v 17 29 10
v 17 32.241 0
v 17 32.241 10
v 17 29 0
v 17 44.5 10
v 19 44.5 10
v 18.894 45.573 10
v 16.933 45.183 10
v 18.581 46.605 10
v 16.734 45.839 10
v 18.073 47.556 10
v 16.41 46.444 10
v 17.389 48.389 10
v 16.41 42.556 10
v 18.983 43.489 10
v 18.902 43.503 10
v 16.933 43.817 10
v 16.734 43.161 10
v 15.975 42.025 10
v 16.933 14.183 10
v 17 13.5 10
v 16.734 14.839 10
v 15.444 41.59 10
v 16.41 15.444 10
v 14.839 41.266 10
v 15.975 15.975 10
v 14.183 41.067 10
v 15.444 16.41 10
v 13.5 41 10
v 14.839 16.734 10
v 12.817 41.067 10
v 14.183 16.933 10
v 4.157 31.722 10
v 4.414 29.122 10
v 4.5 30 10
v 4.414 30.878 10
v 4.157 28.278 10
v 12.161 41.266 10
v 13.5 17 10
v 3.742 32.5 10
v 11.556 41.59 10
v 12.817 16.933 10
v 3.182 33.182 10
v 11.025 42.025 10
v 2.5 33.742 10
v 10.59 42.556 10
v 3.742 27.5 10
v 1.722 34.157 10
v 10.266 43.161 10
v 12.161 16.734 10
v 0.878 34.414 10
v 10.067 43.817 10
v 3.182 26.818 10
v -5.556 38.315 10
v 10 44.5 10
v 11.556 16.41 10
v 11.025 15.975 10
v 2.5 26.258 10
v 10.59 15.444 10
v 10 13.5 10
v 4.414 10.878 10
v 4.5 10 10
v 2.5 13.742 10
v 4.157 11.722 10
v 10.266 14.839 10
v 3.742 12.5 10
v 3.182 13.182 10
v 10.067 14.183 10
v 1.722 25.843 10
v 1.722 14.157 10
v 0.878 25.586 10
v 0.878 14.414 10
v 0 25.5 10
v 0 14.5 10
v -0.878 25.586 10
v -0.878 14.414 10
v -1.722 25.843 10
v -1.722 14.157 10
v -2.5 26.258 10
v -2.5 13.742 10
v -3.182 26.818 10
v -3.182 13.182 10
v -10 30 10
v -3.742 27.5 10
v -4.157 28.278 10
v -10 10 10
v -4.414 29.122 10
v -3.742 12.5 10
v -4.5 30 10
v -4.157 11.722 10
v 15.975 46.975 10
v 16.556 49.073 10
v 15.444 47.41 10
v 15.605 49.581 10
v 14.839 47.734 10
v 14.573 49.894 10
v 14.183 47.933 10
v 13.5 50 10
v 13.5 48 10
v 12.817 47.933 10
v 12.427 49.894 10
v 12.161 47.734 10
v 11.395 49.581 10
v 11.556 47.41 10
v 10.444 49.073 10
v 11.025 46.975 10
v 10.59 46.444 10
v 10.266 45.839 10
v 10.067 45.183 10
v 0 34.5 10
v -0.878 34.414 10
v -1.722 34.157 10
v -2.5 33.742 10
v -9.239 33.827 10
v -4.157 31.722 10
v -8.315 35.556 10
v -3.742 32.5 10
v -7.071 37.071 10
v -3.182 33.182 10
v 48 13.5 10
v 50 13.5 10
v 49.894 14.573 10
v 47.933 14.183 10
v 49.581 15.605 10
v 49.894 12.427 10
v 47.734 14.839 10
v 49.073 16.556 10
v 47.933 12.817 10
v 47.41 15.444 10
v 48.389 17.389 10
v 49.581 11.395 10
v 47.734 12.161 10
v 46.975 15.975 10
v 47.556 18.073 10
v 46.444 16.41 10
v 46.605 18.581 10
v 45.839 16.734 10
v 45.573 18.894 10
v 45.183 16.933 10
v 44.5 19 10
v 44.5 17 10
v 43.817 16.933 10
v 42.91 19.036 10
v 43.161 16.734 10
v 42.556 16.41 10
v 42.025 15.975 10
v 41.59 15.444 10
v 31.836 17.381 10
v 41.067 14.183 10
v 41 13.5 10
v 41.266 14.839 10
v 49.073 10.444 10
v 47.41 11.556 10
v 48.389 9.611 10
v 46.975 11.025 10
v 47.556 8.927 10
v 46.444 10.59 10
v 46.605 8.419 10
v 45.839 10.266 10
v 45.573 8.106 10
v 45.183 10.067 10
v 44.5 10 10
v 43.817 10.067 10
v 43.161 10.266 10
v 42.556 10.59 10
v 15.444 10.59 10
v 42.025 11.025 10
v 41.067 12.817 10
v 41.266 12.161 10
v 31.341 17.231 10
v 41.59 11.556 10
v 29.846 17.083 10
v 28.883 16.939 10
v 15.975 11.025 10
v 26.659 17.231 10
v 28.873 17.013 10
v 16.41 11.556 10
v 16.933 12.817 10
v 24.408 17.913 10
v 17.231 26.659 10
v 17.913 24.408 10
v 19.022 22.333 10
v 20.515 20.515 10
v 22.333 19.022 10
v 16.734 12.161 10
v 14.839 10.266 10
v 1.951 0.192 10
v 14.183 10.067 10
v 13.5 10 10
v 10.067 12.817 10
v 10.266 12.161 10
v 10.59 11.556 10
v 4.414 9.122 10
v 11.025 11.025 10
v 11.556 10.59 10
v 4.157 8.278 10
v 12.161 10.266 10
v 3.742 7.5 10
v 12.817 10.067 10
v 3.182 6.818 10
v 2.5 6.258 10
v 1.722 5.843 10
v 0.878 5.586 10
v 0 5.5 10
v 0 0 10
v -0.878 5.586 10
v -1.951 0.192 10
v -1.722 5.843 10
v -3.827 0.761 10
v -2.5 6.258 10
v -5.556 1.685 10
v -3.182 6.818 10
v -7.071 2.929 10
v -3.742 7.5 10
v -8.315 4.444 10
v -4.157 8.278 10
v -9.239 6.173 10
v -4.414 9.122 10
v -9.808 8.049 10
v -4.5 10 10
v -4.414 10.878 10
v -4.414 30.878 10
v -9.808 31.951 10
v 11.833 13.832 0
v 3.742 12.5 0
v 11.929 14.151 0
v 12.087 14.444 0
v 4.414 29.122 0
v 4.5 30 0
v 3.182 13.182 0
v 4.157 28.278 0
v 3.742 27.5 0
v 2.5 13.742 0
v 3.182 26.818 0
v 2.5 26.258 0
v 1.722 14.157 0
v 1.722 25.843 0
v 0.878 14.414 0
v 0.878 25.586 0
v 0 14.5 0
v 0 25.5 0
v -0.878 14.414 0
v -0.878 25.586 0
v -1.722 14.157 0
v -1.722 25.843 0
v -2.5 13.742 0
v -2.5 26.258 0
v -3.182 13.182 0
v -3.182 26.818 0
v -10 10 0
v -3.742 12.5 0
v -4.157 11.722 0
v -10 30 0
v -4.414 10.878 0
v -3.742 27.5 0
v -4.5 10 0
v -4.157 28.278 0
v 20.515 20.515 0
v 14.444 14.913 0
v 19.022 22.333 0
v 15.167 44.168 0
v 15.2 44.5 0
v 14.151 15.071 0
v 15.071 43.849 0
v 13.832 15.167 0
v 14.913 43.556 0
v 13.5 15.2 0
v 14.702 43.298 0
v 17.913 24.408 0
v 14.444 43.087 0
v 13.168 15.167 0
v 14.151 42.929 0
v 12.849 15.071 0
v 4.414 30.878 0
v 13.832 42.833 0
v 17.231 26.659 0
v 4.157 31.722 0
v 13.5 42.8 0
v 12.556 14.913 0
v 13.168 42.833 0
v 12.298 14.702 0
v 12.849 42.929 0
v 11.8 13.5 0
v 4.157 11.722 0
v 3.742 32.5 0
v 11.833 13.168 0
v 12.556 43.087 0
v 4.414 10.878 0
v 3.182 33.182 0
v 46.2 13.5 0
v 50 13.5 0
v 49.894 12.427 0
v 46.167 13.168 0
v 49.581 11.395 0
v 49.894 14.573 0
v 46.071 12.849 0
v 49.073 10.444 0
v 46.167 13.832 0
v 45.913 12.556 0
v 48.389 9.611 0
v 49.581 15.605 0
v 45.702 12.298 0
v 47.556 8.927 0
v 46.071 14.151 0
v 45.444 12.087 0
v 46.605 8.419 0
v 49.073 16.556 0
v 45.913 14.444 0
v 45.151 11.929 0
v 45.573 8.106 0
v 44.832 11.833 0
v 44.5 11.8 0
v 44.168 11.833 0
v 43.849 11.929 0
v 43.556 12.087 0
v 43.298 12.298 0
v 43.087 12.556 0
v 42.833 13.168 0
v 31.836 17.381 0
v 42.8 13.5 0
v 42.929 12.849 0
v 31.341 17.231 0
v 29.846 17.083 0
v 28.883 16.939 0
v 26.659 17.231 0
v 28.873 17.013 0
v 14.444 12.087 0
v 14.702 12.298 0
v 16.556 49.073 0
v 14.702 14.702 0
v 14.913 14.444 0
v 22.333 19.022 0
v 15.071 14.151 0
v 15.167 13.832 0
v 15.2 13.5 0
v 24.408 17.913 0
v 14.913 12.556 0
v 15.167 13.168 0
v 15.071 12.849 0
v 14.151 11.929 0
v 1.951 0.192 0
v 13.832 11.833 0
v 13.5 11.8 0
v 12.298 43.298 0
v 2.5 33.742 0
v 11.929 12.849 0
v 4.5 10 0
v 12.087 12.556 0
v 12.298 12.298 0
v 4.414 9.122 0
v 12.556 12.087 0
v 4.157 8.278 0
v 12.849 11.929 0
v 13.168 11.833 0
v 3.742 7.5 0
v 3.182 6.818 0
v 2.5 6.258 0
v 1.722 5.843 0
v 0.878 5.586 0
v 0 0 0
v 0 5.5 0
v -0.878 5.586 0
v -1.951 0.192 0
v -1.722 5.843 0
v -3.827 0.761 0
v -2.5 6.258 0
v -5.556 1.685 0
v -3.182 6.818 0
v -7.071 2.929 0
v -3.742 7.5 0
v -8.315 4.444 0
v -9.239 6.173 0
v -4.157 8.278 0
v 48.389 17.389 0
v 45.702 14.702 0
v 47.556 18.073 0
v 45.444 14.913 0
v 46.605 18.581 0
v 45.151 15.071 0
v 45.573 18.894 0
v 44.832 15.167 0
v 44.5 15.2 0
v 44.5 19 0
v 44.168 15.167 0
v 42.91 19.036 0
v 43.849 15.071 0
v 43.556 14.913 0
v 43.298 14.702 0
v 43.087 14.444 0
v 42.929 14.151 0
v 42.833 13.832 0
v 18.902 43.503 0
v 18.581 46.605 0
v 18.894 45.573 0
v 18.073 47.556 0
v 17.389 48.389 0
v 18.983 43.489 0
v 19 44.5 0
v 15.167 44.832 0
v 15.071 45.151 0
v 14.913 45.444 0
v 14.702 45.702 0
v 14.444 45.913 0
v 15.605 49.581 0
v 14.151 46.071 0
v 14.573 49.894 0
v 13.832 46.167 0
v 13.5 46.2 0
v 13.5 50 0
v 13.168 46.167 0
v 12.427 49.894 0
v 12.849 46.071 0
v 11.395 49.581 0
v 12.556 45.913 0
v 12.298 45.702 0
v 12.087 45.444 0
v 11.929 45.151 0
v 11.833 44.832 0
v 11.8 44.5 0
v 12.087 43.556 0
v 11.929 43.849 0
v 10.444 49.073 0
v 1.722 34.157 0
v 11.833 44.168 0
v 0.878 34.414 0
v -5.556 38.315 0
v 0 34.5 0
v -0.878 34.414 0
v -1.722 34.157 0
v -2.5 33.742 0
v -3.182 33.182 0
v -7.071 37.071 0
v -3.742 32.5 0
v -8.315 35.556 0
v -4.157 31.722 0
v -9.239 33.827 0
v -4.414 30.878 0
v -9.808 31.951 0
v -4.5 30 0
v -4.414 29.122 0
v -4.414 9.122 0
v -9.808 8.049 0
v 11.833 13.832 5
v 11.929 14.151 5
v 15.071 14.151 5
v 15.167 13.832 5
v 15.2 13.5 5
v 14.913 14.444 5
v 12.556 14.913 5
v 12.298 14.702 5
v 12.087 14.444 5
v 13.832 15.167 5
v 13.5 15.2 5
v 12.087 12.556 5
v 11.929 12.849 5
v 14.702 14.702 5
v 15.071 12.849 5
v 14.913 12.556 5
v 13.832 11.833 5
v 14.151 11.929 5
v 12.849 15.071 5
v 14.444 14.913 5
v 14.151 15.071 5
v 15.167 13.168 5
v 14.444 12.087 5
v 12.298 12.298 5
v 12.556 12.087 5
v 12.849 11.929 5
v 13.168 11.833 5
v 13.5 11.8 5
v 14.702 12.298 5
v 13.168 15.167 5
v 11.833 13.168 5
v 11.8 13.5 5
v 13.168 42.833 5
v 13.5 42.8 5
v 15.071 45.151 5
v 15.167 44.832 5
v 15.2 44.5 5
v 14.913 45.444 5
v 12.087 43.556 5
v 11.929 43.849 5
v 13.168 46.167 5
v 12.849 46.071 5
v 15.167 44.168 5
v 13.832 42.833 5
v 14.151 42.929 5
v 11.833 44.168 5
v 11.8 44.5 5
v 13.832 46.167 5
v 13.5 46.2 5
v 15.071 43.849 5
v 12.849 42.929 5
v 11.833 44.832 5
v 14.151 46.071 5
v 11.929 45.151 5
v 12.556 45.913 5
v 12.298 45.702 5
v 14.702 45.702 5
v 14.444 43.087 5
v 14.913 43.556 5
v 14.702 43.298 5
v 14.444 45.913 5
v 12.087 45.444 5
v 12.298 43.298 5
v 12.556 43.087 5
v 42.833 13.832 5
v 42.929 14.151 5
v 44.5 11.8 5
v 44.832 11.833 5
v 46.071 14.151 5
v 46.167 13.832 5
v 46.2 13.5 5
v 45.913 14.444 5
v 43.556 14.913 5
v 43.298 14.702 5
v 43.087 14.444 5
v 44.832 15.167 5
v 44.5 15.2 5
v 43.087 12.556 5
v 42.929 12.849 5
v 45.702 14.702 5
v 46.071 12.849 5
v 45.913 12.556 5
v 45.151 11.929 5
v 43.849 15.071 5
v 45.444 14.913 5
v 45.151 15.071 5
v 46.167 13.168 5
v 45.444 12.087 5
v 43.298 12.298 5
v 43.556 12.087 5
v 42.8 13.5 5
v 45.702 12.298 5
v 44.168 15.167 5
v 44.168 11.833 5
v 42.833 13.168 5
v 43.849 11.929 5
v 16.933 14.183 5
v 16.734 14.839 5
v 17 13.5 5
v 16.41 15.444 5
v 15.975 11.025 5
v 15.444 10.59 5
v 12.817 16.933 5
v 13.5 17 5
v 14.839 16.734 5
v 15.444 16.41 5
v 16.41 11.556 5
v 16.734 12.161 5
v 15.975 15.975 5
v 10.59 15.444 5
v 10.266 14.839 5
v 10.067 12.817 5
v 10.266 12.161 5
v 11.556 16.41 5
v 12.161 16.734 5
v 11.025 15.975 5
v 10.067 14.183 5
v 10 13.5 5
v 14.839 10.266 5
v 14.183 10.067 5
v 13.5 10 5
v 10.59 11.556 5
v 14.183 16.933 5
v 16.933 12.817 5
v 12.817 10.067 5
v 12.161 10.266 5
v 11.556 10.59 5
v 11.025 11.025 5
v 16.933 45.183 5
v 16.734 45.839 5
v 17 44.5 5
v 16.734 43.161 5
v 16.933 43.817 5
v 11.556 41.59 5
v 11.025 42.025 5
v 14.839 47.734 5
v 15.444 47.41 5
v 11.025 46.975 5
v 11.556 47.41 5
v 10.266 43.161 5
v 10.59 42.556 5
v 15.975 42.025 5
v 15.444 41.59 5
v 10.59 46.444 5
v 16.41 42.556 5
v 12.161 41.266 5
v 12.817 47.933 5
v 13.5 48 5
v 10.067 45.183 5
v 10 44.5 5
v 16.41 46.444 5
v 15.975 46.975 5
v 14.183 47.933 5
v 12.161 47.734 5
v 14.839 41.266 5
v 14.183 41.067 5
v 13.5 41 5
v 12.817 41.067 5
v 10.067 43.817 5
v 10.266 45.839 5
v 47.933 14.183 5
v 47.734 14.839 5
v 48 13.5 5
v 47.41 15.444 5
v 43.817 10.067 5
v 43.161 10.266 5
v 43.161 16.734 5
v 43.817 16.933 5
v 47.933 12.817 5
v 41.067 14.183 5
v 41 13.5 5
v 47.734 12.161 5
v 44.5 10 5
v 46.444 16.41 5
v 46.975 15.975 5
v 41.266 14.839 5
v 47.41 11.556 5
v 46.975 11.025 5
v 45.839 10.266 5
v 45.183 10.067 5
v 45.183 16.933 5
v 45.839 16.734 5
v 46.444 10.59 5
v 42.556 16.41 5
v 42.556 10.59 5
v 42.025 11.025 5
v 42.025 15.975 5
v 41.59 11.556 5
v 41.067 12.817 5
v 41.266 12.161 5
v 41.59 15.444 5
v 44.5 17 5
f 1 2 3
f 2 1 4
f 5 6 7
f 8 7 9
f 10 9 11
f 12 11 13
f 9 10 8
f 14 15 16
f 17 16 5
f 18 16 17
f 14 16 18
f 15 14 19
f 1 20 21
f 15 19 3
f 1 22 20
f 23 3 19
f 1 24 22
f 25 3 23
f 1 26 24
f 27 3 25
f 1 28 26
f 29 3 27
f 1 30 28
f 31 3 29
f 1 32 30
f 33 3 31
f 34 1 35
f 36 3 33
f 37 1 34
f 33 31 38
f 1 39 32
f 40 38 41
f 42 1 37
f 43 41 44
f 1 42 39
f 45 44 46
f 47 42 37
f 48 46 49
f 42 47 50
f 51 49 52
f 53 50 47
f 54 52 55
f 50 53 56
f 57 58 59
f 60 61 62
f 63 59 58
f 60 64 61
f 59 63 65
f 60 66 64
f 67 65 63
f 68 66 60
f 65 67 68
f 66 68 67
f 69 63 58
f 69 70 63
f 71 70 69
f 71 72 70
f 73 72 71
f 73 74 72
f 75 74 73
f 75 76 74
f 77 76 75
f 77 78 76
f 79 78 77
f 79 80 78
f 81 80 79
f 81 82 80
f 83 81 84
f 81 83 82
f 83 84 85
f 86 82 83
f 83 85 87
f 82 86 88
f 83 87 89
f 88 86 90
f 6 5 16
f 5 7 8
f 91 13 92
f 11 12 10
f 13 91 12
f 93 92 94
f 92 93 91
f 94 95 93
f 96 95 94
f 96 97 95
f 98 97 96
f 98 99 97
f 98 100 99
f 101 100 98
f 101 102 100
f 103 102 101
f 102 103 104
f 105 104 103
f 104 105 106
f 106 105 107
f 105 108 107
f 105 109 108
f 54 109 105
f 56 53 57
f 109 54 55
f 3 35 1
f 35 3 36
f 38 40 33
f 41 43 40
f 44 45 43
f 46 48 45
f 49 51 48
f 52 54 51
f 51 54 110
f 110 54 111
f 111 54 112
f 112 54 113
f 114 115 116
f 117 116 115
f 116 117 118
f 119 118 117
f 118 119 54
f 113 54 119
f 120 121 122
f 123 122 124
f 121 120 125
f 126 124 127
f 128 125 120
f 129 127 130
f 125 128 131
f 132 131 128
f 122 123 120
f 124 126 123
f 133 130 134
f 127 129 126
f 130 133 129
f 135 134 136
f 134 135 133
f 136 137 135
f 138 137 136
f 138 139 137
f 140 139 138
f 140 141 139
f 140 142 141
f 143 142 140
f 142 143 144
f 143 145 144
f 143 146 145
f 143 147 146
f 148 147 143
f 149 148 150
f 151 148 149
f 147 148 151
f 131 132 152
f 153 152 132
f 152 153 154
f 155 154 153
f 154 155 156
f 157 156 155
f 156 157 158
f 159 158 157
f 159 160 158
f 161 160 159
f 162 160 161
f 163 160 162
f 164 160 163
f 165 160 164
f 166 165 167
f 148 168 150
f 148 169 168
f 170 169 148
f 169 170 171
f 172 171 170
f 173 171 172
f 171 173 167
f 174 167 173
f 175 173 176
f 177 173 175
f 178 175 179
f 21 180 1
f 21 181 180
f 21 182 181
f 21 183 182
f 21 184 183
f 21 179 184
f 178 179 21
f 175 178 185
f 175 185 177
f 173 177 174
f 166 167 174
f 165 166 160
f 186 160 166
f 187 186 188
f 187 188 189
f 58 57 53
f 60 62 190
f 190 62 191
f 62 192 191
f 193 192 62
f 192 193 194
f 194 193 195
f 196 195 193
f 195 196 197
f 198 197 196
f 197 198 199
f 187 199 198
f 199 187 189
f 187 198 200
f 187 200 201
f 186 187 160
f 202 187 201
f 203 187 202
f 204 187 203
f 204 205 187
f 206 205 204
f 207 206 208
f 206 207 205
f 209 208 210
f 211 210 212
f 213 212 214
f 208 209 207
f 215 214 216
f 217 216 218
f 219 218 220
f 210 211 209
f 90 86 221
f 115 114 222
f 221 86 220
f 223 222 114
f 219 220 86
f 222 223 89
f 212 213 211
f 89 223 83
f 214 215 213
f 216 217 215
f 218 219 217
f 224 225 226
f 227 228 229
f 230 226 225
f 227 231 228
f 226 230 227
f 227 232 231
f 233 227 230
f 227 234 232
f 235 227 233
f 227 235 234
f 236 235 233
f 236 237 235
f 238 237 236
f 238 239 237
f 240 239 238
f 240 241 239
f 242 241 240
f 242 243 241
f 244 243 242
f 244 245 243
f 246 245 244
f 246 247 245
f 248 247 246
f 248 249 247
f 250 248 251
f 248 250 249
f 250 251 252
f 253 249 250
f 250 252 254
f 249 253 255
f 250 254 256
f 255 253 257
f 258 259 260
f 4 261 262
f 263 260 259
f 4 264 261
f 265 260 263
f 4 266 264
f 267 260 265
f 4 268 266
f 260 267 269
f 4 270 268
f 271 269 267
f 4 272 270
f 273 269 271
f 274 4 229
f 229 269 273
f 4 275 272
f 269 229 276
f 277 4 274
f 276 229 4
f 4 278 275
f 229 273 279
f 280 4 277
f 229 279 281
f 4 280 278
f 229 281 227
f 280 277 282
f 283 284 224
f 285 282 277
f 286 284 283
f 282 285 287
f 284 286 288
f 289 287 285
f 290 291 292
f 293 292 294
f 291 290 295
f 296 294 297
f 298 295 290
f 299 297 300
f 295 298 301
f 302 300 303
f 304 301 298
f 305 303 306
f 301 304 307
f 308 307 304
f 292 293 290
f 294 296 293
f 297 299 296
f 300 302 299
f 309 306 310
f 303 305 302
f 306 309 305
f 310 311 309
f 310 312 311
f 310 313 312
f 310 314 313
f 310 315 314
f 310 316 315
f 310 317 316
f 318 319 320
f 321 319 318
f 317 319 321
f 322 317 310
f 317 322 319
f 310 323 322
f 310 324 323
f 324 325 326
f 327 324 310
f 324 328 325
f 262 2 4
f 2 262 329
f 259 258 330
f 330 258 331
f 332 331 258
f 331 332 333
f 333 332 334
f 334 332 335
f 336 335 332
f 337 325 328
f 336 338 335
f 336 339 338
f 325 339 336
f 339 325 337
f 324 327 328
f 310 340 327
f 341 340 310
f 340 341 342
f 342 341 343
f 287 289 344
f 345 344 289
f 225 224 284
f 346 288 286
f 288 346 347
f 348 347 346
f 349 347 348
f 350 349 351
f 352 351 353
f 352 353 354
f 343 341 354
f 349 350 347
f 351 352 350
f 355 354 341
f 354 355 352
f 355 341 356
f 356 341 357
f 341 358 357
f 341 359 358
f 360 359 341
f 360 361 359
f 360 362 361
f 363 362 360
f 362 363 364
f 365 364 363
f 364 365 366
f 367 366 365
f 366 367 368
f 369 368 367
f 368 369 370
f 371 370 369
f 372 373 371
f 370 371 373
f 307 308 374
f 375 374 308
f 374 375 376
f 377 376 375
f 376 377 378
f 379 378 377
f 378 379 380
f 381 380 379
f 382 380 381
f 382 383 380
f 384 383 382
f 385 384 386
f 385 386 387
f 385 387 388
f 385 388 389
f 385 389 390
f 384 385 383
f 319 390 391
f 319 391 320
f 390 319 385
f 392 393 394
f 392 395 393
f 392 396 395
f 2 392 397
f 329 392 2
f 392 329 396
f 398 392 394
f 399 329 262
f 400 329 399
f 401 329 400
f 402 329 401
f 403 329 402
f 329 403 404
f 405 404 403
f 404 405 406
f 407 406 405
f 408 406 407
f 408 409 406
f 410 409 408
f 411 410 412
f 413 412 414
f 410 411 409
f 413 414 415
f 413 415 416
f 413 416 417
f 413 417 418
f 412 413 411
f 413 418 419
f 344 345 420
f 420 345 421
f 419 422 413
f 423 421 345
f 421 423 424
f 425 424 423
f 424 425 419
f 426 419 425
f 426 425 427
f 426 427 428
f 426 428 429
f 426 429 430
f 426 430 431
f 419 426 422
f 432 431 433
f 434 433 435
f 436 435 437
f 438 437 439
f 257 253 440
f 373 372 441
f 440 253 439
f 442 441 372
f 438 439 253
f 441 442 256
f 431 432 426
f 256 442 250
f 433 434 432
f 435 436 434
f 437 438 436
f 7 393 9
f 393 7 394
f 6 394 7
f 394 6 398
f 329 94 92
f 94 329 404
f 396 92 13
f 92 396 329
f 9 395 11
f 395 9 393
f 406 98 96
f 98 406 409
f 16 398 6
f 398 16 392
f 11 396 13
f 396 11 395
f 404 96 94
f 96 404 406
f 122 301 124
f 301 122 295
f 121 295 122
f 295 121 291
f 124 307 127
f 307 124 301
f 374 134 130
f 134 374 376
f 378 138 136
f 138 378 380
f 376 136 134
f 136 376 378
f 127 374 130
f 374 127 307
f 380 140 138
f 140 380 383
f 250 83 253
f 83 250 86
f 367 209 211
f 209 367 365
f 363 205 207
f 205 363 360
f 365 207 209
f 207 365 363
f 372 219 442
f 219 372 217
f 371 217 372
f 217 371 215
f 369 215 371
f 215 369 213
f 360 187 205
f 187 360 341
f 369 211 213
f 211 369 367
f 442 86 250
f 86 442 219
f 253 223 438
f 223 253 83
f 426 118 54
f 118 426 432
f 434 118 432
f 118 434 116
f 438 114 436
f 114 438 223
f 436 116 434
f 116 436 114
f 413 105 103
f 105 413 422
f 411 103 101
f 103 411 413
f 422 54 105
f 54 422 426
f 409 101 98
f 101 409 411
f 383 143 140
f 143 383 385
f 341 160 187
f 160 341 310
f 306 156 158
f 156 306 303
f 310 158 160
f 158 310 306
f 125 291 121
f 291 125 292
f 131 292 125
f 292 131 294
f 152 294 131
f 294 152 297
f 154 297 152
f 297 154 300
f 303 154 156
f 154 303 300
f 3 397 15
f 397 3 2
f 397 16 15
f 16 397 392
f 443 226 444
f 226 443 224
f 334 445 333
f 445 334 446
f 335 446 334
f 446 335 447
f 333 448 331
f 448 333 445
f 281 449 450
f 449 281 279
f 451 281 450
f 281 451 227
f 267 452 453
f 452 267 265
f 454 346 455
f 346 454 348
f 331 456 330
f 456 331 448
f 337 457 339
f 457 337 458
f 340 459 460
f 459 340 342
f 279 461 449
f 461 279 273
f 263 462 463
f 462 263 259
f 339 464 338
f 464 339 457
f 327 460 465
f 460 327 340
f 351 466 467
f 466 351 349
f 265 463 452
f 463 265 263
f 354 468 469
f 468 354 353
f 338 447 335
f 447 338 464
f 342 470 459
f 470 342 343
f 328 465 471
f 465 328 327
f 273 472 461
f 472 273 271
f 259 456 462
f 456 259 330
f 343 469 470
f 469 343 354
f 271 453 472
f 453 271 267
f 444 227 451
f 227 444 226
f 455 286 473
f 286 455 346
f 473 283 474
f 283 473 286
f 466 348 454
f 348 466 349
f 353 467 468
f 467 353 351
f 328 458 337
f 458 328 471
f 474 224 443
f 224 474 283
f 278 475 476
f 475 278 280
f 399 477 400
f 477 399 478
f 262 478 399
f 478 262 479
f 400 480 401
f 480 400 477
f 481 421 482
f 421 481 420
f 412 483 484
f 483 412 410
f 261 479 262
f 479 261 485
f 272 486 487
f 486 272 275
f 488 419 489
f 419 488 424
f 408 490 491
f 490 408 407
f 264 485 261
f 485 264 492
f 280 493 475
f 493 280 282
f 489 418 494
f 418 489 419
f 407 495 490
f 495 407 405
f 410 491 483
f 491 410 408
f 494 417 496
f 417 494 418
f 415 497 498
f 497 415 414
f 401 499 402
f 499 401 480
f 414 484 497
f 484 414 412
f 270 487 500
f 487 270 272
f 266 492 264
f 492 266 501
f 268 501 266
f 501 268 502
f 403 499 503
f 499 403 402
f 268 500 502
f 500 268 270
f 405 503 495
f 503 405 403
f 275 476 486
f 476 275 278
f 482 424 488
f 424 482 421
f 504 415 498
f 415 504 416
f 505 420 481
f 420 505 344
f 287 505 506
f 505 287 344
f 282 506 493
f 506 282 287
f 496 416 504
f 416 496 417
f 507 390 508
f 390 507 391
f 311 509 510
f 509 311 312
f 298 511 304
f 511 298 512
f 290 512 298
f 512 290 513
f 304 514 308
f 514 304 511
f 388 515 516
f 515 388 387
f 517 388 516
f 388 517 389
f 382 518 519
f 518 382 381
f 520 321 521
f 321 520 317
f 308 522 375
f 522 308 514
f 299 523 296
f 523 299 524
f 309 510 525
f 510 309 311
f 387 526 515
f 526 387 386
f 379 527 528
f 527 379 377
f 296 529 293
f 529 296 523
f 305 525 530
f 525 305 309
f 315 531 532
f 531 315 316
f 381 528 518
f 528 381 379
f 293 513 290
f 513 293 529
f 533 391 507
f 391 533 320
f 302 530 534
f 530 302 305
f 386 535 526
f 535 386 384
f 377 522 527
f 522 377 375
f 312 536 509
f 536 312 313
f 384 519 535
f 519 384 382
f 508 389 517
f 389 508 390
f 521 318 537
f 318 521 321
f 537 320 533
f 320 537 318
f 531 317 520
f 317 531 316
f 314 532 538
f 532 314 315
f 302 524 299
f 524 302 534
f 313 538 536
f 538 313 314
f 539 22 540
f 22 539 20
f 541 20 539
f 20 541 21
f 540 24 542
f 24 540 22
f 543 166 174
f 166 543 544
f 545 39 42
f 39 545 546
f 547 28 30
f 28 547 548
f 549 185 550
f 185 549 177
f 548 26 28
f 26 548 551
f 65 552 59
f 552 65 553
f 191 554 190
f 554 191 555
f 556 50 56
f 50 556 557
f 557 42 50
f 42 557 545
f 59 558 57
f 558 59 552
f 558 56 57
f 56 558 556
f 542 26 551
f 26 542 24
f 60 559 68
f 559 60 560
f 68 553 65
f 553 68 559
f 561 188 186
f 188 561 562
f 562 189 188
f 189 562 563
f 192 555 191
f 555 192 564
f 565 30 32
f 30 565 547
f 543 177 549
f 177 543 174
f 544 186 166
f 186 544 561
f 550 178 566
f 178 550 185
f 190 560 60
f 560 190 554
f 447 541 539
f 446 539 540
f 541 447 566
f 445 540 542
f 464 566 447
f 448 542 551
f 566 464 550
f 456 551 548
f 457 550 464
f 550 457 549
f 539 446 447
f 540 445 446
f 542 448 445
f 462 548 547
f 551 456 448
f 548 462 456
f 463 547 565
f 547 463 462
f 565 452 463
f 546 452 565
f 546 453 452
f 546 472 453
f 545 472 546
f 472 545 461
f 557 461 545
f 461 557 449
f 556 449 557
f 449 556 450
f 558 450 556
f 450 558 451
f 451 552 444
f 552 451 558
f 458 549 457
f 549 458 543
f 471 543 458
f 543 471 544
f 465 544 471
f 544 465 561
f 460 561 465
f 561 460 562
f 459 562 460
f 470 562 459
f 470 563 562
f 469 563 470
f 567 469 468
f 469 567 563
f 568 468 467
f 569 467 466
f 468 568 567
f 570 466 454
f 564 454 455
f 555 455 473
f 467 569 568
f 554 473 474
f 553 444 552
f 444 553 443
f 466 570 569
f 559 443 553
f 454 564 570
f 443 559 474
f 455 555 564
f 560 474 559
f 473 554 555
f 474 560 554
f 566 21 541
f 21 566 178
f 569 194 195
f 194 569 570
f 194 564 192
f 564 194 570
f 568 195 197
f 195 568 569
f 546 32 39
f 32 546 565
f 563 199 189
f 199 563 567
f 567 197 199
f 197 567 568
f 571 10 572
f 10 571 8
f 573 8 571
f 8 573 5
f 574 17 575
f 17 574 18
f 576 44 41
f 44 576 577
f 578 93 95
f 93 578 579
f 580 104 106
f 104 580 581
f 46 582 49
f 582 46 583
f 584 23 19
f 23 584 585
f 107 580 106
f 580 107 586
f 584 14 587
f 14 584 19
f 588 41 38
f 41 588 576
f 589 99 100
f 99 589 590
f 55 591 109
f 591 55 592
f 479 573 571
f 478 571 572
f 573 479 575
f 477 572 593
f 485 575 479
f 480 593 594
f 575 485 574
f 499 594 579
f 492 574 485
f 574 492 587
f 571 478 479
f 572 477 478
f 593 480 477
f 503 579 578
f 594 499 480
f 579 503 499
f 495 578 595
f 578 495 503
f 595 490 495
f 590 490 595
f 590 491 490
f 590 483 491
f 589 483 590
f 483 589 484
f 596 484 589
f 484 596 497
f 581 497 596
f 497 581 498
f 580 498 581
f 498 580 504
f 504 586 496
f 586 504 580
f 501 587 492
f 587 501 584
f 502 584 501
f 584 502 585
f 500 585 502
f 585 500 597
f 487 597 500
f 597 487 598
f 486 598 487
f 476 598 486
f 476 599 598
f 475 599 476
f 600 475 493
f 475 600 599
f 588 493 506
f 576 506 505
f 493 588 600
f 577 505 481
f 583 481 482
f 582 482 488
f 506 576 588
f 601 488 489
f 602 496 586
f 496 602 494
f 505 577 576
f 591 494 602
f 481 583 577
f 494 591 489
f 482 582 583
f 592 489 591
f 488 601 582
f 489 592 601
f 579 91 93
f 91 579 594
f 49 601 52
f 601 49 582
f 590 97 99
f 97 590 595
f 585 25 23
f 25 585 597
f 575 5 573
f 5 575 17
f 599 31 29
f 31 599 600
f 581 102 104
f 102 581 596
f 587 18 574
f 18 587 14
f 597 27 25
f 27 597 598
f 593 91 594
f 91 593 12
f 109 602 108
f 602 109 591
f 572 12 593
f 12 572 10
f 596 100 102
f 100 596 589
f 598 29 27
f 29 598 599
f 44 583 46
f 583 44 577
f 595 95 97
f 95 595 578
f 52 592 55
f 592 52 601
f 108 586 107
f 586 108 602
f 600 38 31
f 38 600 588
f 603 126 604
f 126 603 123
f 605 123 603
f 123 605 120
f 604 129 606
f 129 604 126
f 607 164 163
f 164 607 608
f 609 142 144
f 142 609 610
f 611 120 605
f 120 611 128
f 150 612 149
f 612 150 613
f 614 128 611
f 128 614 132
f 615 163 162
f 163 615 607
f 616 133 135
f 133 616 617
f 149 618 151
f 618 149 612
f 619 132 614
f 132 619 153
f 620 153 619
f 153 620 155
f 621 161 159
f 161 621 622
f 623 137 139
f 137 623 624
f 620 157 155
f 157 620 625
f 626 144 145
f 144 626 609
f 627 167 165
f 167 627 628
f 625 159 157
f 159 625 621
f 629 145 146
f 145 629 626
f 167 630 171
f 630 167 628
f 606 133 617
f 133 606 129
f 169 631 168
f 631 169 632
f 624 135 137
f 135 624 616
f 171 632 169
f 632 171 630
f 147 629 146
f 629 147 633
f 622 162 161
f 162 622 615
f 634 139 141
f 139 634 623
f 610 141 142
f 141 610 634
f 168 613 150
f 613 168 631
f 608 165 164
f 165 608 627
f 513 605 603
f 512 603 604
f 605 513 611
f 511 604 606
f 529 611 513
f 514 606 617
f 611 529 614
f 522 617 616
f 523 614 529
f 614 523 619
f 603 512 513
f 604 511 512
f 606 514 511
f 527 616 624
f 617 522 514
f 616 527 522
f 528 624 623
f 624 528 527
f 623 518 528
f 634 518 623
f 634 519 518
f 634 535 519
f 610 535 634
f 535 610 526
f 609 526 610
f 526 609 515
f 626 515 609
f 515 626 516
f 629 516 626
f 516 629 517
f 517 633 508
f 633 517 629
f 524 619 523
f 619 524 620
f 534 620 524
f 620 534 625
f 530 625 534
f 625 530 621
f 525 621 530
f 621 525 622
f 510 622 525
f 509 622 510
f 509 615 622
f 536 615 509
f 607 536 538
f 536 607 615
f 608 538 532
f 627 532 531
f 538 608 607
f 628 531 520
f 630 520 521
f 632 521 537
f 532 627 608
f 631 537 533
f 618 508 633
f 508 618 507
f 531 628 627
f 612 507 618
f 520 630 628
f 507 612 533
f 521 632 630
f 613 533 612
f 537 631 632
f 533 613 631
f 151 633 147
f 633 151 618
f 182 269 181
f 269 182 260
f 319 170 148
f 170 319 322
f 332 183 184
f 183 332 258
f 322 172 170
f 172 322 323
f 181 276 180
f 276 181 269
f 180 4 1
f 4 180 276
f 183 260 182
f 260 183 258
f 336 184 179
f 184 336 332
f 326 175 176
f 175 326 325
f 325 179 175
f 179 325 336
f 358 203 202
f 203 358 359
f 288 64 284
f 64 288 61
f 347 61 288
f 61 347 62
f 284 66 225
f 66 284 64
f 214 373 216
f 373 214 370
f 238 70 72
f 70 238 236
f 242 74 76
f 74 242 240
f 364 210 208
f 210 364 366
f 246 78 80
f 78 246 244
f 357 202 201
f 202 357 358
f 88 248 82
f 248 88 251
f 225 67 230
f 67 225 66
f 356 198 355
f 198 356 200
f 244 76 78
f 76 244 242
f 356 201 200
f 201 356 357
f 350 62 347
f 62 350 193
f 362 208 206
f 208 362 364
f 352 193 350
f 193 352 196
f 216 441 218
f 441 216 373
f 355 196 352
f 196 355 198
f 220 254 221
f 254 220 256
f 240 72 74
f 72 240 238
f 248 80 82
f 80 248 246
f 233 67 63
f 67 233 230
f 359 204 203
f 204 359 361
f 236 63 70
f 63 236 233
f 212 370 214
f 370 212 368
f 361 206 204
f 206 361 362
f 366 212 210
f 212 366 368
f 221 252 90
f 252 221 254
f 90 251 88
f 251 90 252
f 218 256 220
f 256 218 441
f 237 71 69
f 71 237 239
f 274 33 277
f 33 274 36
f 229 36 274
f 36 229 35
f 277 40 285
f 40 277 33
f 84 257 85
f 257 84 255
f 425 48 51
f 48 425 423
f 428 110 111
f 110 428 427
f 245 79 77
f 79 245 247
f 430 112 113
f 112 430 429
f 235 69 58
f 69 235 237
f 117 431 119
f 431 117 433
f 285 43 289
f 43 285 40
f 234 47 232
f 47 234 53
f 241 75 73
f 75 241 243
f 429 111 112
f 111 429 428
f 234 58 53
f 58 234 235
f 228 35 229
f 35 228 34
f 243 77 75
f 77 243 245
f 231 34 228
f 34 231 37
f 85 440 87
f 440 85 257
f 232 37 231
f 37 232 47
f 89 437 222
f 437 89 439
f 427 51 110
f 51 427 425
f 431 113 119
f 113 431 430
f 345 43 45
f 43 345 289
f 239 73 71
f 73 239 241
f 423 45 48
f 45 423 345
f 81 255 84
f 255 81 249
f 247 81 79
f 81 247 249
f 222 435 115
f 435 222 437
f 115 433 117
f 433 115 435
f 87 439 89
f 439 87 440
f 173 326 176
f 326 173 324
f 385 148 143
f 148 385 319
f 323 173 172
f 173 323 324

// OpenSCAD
// PRUSA iteration3
// Y motor mount
// GNU GPL v3
// Josef Průša <iam@josefprusa.cz> and contributors
// http://www.reprap.org/wiki/Prusa_Mendel
// http://prusamendel.org

//-- mods by Xoan Sampaiño - A Coruña, May 2013
//--	- added 3rd motor mount point.

//-- further mods by AndrewBCN - Barcelona, November 2014
//--	- added a couple of reinforcements, some code cleanup

$fn=32;


//-- Solid part
module y_motor_base() {
  // Motor holding part
  translate([29,-21+50,0]) {
    translate([-21+4.5,0,5]) cube([9,31,10], center=true);
    translate([-21+4.5+31/2+1,0-31/2-1,5]) cube([31,9,10], center=true);
    translate([-15.5,-15.5,0]) cube([15.5,15.5,10], center=false);
    translate([-15.5,+15.5,0]) cylinder(h = 10, r=5.5);
    translate([+15.5,-15.5,0]) cylinder(h = 10, r=5.5);
    // Joins motor holder and rod plate
    translate([-29,-21,0]) cube(size = [14,30,10]);
  }
  // Front holding part
  translate([-2,20,5]) cube([16,20,10], center=true);	
  translate([0,10,0]) cylinder(h = 10, r=10);
  translate([0,30,0]) cylinder(h = 10, r=10);
  // Reinforcements and smoothing out
  hull() {
    translate([0,30,0]) cylinder(h = 10, r=10);
    translate([29,-21+50,0]) translate([-15.5,+15.5,0]) cylinder(h = 10, r=5.5);
  }
  hull() {
    translate([0,10,0]) cylinder(h = 10, r=10);
    translate([29,-21+50,0]) translate([15.5,-15.5,0]) cylinder(h = 10, r=5.5);
  }
  translate([17,38,5]) rotate([0,0,-10]) cube([2,11.5,10], center=true);
}

//-- Holes
module y_motor_holes() {
  translate([29,-21+50,0]){
    // Screw head holes
    translate([-15.5,-15.5,-1]) cylinder(h = 10, r=1.7);
    translate([-15.5,+15.5,-1]) cylinder(h = 10, r=1.7);
    translate([+15.5,-15.5,-1]) cylinder(h = 10, r=1.7);
    // Screw holes
    translate([-15.5,-15.5,5]) cylinder(h = 7, r=3.5);
    translate([-15.5,+15.5,5]) cylinder(h = 7, r=3.5);
    translate([+15.5,-15.5,5]) cylinder(h = 7, r=3.5);
    // Shaft hole
    translate([0,0,5]) cylinder(h = 11, r = 12, center = true);
  }
  translate([0,10,-1]) cylinder(h = 12, r=4.5);	
  translate([0,30,-1]) cylinder(h = 12, r=4.5);
  // Smooth out
  translate([36.5,20.1,5]) rotate([0,0,8.5]) cube([16,4,20], center=true);
}

// Final assembly
module y_motor() {
  difference() {
    y_motor_base();
    y_motor_holes();
  }
}

y_motor();
